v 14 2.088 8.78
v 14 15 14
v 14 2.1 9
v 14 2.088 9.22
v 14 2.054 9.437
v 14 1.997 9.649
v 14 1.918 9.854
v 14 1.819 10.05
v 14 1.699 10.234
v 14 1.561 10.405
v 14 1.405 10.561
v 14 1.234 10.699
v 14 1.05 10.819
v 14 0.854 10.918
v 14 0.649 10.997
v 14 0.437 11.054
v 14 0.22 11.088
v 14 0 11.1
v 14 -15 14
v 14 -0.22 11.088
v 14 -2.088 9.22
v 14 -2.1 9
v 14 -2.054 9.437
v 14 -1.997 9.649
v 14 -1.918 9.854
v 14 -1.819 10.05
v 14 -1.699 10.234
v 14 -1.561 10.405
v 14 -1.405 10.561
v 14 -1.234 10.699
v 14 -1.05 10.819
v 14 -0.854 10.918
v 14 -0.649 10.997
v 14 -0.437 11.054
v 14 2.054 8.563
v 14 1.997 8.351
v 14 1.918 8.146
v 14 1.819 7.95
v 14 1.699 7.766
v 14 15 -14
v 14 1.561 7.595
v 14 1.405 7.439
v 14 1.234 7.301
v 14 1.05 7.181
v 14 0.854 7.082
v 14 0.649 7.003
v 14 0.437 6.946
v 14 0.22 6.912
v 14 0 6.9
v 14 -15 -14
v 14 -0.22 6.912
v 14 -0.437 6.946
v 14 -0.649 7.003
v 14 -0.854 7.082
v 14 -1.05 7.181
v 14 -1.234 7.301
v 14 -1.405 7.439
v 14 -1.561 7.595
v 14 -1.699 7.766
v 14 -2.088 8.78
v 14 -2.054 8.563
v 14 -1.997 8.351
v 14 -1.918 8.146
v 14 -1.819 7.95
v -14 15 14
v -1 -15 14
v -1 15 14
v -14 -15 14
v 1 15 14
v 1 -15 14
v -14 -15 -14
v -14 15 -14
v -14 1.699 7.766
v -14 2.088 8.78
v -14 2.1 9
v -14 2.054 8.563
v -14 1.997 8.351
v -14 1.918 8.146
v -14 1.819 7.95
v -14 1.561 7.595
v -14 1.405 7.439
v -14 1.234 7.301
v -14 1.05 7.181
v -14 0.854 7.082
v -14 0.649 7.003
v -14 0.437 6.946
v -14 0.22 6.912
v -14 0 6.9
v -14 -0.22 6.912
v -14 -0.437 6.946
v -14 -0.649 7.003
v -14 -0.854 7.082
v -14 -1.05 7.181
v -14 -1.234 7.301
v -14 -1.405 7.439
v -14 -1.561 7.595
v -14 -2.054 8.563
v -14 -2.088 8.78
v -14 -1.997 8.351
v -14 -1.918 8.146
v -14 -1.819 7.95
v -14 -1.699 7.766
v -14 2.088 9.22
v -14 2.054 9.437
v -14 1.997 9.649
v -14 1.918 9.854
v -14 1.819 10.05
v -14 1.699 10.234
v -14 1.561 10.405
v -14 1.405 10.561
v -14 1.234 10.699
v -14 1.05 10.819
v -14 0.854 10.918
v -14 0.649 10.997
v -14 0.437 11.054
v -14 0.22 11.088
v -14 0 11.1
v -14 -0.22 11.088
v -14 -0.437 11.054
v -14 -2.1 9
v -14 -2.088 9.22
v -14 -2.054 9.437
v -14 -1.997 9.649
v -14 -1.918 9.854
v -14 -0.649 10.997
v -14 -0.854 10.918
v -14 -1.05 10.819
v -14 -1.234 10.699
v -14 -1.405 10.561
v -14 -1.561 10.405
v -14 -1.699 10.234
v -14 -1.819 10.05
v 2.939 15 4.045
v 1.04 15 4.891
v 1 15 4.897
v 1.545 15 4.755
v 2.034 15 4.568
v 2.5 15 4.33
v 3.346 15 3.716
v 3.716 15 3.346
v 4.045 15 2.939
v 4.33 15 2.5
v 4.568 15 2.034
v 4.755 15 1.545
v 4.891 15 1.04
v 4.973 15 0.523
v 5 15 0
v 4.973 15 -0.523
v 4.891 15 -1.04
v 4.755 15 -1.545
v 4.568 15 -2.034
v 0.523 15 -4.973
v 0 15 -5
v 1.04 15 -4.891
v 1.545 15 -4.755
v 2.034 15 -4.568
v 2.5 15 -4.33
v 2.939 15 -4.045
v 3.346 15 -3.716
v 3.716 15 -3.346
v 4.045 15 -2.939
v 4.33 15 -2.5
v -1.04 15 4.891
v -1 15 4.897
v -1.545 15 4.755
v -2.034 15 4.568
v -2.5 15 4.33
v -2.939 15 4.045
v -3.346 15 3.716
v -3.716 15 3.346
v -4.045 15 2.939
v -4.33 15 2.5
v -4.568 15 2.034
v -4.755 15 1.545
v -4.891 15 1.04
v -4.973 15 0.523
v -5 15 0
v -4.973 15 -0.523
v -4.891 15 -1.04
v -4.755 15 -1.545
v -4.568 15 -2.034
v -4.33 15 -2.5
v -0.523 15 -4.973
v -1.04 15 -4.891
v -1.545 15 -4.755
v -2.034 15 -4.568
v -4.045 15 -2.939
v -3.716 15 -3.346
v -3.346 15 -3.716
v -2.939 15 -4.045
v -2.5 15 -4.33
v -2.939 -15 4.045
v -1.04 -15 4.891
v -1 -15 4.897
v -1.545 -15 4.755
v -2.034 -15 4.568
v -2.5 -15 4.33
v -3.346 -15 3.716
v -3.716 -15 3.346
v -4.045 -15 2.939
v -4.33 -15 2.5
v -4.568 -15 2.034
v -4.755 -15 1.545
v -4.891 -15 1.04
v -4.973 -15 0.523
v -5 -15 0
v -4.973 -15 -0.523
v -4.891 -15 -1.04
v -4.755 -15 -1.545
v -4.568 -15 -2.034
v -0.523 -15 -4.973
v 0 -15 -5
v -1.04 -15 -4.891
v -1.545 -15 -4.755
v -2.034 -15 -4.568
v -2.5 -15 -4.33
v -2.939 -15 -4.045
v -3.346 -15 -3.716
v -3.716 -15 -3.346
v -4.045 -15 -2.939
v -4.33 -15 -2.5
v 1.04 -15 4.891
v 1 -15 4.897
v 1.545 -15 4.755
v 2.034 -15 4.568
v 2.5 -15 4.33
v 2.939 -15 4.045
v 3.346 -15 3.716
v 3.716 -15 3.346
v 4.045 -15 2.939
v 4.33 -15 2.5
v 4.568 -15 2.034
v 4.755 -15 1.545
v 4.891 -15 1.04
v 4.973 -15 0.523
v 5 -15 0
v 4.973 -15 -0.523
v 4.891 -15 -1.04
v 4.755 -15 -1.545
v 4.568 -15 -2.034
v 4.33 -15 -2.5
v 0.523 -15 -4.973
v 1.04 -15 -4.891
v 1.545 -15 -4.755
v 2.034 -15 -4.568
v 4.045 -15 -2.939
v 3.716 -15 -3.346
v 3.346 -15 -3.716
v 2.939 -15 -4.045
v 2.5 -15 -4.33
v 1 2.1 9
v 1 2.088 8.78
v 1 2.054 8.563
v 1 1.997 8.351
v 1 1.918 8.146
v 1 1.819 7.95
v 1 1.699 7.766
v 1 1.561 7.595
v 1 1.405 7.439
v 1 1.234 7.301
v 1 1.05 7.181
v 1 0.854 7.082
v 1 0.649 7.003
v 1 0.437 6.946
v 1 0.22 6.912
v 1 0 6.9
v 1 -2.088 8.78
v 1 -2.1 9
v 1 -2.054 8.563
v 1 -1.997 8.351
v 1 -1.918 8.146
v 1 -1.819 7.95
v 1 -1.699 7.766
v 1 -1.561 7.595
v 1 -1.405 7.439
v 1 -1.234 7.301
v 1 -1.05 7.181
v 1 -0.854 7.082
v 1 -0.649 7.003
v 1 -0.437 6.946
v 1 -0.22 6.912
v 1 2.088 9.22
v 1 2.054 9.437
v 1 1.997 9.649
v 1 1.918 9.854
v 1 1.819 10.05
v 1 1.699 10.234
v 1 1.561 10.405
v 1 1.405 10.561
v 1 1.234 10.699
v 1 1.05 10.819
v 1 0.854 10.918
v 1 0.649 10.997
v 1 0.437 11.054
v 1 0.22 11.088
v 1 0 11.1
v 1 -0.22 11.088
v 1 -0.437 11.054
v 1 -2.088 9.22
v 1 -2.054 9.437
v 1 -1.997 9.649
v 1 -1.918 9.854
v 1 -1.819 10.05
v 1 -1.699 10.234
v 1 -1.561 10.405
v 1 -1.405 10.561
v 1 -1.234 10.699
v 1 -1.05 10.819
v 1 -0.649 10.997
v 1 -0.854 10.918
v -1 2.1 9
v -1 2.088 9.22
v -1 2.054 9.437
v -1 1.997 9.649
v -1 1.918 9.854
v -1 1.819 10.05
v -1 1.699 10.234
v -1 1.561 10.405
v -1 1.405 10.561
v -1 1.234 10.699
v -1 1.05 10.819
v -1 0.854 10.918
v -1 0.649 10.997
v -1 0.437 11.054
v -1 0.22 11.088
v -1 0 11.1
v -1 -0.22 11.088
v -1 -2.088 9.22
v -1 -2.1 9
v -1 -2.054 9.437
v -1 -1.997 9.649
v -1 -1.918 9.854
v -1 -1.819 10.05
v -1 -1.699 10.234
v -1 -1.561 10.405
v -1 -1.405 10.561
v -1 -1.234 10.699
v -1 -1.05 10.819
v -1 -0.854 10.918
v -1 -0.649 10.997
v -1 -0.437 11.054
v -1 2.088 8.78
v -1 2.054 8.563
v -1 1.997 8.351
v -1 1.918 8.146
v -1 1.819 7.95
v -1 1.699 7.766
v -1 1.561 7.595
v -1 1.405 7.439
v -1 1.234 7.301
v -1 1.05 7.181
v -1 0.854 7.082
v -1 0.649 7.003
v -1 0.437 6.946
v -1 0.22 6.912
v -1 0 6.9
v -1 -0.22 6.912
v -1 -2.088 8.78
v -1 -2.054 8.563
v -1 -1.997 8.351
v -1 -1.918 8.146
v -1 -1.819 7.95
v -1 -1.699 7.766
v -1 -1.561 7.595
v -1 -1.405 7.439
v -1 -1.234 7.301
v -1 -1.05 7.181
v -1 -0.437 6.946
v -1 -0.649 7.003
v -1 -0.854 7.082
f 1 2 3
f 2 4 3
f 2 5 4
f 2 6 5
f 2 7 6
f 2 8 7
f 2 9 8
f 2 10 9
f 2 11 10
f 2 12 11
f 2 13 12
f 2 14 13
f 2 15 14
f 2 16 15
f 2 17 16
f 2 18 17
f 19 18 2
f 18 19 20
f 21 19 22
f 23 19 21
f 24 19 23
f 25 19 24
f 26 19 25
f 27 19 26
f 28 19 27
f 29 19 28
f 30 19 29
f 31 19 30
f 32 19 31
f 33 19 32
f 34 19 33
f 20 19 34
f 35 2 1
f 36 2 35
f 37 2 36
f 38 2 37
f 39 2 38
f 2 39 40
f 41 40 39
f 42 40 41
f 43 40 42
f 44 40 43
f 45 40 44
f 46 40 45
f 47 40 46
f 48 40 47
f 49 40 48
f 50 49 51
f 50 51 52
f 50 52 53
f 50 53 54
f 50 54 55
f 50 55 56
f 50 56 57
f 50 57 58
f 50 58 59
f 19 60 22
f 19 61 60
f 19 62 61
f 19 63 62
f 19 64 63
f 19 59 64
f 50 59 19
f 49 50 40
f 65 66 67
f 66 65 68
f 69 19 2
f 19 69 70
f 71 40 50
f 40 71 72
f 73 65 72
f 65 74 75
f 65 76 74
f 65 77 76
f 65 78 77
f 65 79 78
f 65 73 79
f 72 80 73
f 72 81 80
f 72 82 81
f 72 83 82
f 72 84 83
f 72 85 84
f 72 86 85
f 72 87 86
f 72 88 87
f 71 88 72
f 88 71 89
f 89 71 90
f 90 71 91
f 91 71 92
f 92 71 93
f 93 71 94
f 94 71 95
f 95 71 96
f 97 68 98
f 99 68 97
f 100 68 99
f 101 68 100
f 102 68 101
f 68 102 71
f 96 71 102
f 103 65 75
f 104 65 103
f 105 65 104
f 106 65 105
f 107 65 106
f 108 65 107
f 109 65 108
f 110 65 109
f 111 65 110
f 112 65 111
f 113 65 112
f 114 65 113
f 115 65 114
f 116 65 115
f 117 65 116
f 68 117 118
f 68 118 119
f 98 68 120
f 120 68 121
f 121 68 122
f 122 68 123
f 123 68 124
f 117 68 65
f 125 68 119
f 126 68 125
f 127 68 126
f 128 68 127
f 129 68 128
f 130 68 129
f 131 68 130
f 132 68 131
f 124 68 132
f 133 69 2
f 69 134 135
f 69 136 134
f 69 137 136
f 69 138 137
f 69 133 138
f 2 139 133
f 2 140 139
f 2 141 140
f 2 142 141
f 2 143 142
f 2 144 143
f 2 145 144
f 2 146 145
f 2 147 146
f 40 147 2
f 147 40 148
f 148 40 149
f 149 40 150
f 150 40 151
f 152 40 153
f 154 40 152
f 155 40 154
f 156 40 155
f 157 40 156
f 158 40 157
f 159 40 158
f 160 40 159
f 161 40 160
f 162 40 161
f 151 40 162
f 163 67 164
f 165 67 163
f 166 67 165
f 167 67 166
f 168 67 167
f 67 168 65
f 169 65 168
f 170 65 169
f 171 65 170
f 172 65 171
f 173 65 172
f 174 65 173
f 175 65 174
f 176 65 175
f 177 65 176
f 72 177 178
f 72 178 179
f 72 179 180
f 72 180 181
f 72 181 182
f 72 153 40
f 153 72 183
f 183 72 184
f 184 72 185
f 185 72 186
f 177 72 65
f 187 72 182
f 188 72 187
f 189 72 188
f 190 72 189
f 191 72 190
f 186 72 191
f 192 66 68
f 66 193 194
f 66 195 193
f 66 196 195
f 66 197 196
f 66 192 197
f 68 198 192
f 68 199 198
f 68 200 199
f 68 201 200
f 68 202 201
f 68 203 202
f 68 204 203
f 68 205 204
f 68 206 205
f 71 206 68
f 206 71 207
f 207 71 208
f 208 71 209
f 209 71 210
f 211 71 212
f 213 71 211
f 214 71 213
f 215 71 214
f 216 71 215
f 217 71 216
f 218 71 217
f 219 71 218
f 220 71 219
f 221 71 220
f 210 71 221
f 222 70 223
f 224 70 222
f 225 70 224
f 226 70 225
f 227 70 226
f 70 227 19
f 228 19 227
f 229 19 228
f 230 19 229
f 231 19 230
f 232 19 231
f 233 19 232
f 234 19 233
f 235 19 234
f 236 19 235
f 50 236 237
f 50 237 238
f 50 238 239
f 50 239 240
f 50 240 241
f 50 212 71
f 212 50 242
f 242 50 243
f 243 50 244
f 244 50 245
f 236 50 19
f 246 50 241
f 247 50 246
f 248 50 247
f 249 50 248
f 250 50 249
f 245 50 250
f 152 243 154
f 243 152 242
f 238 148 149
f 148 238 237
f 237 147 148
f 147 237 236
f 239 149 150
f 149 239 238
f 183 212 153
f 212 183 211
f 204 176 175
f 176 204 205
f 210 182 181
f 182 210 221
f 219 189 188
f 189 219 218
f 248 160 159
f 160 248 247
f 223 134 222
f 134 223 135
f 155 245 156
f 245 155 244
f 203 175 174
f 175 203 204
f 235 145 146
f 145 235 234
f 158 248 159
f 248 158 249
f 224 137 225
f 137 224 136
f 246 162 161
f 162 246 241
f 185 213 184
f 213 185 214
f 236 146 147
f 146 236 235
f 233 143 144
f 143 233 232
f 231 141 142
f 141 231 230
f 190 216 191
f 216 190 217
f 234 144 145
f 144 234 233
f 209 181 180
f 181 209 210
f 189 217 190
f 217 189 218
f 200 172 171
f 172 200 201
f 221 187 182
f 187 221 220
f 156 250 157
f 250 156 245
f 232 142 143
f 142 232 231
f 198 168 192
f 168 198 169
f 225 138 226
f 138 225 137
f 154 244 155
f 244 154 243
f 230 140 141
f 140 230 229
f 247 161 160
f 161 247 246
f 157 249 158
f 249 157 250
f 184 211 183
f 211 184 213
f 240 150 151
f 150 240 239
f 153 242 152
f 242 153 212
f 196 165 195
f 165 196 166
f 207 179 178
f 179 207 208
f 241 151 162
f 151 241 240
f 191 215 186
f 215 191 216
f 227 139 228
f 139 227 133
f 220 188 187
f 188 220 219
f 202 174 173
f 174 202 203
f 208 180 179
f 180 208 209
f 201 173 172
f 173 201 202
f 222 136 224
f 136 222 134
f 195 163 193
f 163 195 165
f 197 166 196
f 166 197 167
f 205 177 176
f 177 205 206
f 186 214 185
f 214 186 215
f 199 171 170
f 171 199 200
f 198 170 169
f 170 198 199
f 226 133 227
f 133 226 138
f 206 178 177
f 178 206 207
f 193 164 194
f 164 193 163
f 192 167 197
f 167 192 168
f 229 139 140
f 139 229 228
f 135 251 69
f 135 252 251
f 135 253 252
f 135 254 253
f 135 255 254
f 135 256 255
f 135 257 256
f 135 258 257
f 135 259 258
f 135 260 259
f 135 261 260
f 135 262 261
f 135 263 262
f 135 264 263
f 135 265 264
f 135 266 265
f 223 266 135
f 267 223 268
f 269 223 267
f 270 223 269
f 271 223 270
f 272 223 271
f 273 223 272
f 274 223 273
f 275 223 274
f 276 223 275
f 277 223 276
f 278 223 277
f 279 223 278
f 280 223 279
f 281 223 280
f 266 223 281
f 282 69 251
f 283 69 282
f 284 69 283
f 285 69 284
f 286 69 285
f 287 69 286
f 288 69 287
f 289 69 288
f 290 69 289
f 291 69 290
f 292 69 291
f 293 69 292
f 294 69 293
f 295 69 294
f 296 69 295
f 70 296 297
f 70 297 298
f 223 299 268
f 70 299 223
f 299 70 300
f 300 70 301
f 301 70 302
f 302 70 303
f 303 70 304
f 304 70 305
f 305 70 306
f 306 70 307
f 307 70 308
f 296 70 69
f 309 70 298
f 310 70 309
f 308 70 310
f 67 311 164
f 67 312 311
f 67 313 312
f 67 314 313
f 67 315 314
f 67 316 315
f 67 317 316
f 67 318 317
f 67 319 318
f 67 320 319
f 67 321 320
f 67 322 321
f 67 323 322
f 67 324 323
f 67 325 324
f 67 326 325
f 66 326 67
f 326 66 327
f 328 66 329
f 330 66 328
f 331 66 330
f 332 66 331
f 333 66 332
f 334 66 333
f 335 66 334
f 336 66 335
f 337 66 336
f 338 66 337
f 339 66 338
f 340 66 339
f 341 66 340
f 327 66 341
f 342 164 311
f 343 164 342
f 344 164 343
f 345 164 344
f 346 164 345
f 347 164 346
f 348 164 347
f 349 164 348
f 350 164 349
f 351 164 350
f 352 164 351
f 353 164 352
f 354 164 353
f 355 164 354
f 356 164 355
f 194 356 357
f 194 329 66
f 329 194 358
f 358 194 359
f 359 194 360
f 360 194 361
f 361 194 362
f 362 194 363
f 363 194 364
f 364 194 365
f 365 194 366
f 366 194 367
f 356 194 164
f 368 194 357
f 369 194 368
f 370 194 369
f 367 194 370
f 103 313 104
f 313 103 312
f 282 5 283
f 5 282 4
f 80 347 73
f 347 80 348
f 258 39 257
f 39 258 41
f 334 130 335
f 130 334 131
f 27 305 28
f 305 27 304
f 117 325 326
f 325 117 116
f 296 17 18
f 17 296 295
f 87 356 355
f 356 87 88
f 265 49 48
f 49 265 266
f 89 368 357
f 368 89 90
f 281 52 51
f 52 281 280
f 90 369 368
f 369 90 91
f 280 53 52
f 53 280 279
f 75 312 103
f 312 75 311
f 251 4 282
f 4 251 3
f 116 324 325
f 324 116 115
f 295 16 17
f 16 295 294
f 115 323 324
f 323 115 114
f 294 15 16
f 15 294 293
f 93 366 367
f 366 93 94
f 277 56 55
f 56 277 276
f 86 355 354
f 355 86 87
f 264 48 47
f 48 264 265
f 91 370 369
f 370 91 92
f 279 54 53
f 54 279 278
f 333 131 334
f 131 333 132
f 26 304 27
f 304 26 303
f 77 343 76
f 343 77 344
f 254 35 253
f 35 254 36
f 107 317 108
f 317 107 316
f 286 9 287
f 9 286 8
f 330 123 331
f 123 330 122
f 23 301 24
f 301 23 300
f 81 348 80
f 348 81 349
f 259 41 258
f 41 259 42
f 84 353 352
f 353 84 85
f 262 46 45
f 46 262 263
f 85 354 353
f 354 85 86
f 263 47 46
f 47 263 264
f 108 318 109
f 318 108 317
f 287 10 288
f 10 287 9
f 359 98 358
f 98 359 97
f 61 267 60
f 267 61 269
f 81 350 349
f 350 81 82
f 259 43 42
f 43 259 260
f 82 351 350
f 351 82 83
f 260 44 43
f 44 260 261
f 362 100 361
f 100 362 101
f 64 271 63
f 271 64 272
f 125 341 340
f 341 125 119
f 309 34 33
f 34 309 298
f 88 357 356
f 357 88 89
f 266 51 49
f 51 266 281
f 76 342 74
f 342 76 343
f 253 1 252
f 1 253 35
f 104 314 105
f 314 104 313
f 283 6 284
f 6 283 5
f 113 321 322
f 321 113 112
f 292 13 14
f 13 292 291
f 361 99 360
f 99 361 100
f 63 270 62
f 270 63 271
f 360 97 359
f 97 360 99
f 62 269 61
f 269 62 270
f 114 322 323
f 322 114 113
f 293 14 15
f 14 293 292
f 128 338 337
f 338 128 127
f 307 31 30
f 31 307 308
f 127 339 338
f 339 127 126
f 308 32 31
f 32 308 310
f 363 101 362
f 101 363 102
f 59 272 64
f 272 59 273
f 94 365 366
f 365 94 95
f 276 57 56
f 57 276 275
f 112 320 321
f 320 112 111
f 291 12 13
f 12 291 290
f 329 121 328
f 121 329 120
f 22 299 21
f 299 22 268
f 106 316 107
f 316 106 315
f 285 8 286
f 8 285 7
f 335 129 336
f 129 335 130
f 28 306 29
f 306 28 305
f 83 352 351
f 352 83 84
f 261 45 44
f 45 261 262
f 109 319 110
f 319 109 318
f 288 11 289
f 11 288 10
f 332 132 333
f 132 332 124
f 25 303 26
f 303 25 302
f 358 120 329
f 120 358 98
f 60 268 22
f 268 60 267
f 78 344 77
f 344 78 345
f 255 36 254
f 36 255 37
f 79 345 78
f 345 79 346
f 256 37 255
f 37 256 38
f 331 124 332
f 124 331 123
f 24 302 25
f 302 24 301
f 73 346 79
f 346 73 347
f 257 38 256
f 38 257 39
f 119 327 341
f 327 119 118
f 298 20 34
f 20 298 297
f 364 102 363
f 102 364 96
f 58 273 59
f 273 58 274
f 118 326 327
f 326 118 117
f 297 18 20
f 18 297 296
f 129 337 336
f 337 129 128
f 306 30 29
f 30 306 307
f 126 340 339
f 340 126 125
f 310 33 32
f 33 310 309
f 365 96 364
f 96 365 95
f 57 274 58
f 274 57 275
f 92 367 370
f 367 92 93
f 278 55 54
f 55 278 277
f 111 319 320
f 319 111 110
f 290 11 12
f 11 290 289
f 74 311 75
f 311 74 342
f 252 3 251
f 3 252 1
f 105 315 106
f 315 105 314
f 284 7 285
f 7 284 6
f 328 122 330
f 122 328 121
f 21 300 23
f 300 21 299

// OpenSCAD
// Split clamp block.
$fn = 60;
eps = 0.02;
bore_d = 10;
body_w = 30;
body_h = 28;
body_l = 28;
slot_w = 2;
difference() {
    cube([body_l, body_w, body_h], center = true);
    translate([0, -body_w / 2 - eps, 0]) rotate([-90,0,0]) cylinder(d = bore_d, h = body_w + 2 * eps);
    translate([-slot_w / 2, -body_w / 2 - eps, 0]) cube([slot_w, body_w + 2 * eps, body_h / 2 + eps]);
    translate([-body_l / 2 - eps, 0, body_h / 2 - 5]) rotate([0,90,0]) cylinder(d = 4.2, h = body_l + 2 * eps);
}
